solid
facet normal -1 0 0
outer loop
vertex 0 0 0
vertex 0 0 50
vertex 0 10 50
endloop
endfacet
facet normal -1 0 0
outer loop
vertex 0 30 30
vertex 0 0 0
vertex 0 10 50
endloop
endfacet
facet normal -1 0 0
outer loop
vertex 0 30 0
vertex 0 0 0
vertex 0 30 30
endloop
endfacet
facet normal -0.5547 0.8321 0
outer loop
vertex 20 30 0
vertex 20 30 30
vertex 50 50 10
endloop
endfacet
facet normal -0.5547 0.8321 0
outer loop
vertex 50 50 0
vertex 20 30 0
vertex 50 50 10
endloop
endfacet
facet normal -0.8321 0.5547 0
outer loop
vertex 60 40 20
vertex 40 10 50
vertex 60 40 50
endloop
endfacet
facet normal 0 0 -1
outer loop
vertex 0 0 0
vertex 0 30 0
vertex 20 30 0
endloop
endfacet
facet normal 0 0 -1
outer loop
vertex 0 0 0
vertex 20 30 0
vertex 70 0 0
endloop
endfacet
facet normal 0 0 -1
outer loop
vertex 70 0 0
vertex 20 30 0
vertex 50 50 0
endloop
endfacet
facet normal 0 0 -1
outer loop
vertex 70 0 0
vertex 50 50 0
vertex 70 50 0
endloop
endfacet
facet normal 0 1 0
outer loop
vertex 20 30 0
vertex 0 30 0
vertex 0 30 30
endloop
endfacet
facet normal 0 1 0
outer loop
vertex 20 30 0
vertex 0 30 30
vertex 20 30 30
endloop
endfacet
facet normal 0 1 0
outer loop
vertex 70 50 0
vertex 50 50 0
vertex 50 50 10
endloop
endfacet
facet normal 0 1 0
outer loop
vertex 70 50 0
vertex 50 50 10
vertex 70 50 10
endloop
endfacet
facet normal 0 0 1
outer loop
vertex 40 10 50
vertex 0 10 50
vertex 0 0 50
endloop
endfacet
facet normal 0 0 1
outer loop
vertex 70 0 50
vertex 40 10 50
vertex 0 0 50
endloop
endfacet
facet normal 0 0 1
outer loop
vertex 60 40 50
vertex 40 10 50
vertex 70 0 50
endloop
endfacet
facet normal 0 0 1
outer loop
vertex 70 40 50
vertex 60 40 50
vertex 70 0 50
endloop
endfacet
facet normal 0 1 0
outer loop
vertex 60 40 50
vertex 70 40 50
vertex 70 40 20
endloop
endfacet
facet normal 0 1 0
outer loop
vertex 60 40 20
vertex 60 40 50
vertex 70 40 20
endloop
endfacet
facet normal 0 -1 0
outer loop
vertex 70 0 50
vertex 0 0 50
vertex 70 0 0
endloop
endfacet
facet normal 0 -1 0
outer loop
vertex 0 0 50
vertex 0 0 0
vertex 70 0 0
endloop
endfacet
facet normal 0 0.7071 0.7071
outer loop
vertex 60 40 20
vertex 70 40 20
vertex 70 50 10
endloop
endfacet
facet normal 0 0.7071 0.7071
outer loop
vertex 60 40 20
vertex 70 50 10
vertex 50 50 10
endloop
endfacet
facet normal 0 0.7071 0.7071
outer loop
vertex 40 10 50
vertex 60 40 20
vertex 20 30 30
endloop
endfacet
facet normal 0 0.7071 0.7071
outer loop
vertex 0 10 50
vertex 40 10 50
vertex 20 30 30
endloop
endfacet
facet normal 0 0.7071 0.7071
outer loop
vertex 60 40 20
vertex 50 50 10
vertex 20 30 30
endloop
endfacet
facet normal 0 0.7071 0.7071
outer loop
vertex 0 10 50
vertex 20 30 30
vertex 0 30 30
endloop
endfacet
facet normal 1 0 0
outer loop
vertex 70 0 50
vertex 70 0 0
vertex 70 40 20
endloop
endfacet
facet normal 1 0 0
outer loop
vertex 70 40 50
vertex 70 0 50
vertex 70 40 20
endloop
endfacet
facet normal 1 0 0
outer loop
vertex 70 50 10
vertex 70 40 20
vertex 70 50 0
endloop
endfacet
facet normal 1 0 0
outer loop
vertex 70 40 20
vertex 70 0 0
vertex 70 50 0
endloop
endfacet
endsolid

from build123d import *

# Parameters (mm, degrees)
SKETCH1_W           = 70
SKETCH1_H           = 50
BOSS_EXTRUDE1_DEPTH = 50
CUT_EXTRUDE1_DEPTH  = 50
CUT_EXTRUDE2_DEPTH  = 50
CUT_EXTRUDE3_DEPTH  = 30
BOSS_EXTRUDE2_DEPTH = 30
CUT_EXTRUDE4_DEPTH  = 54
SKETCH7_W           = 70
SKETCH7_H           = 50
CUT_EXTRUDE5_DEPTH  = 54
SKETCH8_W           = 70
SKETCH8_H           = 49.997172982
CUT_EXTRUDE6_DEPTH  = 54
BOSS_EXTRUDE3_DEPTH = 30


with BuildPart() as part:
    # Sketch1 → Boss-Extrude1 (new body)
    with BuildSketch(Plane.XY):
        with Locations((35, 25)):
            Rectangle(SKETCH1_W, SKETCH1_H)
    extrude(amount=BOSS_EXTRUDE1_DEPTH)

    # Sketch2 → Cut-Extrude1 (cut)
    with BuildSketch(Plane.XY.offset(50)):
        Polygon((0, 30), (20, 30), (50, 50), (0, 50), align=None)
    extrude(amount=-CUT_EXTRUDE1_DEPTH, mode=Mode.SUBTRACT)

    # Sketch3 → Cut-Extrude2 (cut)
    with BuildSketch(Plane(origin=(70, 0, 0), x_dir=(0, 0, -1), z_dir=(1, 0, 0))):
        Polygon((-50, 40), (-20, 40), (-10, 50), (-50, 50), align=None)
    extrude(amount=-CUT_EXTRUDE2_DEPTH, mode=Mode.SUBTRACT)

    # Sketch4 → Cut-Extrude3 (cut)
    with BuildSketch(Plane.XY.offset(50)):
        Polygon((40, 10), (60, 40), (35, 40), (20, 30), (0, 30), (0, 10), align=None)
    extrude(amount=-CUT_EXTRUDE3_DEPTH, mode=Mode.SUBTRACT)

    # Sketch5 → Boss-Extrude2 (add)
    with BuildSketch(Plane(origin=(0, 30, 30), x_dir=(-1, 0, 0), z_dir=(0, -0.707106781, -0.707106781))):
        Polygon((-70, 28.284271247), (-40, -28.284271247), (0, -28.284271247), (0, 0), (-50, 28.284271247), align=None)
    extrude(amount=BOSS_EXTRUDE2_DEPTH)

    # Sketch6 → Cut-Extrude4 (cut)
    with BuildSketch(Plane(origin=(0, 0, 0), x_dir=(-1, 0, 0), z_dir=(0, 0, -1))):
        Polygon((-50, 50), (-20, 30), (0, 30), (0, 60), (-50, 60), align=None)
    extrude(amount=-CUT_EXTRUDE4_DEPTH, mode=Mode.SUBTRACT)

    # Sketch7 → Cut-Extrude5 (cut)
    with BuildSketch(Plane.XZ):
        with Locations((35, 25)):
            Rectangle(SKETCH7_W, SKETCH7_H)
    extrude(amount=CUT_EXTRUDE5_DEPTH, mode=Mode.SUBTRACT)

    # Sketch8 → Cut-Extrude6 (cut)
    with BuildSketch(Plane(origin=(0, 0, 0), x_dir=(-1, 0, 0), z_dir=(0, 0, -1))):
        with Locations((-35, 24.998586491)):
            Rectangle(SKETCH8_W, SKETCH8_H)
    extrude(amount=CUT_EXTRUDE6_DEPTH, mode=Mode.SUBTRACT)

    # Sketch9 → Boss-Extrude3 (add)
    with BuildSketch(Plane(origin=(0, 30, 0), x_dir=(1, 0, 0), z_dir=(0, 1, 0))):
        Polygon((12.5, -20), (0, -20), (0, -30), align=None)
    extrude(amount=-BOSS_EXTRUDE3_DEPTH)


solid = part.part
